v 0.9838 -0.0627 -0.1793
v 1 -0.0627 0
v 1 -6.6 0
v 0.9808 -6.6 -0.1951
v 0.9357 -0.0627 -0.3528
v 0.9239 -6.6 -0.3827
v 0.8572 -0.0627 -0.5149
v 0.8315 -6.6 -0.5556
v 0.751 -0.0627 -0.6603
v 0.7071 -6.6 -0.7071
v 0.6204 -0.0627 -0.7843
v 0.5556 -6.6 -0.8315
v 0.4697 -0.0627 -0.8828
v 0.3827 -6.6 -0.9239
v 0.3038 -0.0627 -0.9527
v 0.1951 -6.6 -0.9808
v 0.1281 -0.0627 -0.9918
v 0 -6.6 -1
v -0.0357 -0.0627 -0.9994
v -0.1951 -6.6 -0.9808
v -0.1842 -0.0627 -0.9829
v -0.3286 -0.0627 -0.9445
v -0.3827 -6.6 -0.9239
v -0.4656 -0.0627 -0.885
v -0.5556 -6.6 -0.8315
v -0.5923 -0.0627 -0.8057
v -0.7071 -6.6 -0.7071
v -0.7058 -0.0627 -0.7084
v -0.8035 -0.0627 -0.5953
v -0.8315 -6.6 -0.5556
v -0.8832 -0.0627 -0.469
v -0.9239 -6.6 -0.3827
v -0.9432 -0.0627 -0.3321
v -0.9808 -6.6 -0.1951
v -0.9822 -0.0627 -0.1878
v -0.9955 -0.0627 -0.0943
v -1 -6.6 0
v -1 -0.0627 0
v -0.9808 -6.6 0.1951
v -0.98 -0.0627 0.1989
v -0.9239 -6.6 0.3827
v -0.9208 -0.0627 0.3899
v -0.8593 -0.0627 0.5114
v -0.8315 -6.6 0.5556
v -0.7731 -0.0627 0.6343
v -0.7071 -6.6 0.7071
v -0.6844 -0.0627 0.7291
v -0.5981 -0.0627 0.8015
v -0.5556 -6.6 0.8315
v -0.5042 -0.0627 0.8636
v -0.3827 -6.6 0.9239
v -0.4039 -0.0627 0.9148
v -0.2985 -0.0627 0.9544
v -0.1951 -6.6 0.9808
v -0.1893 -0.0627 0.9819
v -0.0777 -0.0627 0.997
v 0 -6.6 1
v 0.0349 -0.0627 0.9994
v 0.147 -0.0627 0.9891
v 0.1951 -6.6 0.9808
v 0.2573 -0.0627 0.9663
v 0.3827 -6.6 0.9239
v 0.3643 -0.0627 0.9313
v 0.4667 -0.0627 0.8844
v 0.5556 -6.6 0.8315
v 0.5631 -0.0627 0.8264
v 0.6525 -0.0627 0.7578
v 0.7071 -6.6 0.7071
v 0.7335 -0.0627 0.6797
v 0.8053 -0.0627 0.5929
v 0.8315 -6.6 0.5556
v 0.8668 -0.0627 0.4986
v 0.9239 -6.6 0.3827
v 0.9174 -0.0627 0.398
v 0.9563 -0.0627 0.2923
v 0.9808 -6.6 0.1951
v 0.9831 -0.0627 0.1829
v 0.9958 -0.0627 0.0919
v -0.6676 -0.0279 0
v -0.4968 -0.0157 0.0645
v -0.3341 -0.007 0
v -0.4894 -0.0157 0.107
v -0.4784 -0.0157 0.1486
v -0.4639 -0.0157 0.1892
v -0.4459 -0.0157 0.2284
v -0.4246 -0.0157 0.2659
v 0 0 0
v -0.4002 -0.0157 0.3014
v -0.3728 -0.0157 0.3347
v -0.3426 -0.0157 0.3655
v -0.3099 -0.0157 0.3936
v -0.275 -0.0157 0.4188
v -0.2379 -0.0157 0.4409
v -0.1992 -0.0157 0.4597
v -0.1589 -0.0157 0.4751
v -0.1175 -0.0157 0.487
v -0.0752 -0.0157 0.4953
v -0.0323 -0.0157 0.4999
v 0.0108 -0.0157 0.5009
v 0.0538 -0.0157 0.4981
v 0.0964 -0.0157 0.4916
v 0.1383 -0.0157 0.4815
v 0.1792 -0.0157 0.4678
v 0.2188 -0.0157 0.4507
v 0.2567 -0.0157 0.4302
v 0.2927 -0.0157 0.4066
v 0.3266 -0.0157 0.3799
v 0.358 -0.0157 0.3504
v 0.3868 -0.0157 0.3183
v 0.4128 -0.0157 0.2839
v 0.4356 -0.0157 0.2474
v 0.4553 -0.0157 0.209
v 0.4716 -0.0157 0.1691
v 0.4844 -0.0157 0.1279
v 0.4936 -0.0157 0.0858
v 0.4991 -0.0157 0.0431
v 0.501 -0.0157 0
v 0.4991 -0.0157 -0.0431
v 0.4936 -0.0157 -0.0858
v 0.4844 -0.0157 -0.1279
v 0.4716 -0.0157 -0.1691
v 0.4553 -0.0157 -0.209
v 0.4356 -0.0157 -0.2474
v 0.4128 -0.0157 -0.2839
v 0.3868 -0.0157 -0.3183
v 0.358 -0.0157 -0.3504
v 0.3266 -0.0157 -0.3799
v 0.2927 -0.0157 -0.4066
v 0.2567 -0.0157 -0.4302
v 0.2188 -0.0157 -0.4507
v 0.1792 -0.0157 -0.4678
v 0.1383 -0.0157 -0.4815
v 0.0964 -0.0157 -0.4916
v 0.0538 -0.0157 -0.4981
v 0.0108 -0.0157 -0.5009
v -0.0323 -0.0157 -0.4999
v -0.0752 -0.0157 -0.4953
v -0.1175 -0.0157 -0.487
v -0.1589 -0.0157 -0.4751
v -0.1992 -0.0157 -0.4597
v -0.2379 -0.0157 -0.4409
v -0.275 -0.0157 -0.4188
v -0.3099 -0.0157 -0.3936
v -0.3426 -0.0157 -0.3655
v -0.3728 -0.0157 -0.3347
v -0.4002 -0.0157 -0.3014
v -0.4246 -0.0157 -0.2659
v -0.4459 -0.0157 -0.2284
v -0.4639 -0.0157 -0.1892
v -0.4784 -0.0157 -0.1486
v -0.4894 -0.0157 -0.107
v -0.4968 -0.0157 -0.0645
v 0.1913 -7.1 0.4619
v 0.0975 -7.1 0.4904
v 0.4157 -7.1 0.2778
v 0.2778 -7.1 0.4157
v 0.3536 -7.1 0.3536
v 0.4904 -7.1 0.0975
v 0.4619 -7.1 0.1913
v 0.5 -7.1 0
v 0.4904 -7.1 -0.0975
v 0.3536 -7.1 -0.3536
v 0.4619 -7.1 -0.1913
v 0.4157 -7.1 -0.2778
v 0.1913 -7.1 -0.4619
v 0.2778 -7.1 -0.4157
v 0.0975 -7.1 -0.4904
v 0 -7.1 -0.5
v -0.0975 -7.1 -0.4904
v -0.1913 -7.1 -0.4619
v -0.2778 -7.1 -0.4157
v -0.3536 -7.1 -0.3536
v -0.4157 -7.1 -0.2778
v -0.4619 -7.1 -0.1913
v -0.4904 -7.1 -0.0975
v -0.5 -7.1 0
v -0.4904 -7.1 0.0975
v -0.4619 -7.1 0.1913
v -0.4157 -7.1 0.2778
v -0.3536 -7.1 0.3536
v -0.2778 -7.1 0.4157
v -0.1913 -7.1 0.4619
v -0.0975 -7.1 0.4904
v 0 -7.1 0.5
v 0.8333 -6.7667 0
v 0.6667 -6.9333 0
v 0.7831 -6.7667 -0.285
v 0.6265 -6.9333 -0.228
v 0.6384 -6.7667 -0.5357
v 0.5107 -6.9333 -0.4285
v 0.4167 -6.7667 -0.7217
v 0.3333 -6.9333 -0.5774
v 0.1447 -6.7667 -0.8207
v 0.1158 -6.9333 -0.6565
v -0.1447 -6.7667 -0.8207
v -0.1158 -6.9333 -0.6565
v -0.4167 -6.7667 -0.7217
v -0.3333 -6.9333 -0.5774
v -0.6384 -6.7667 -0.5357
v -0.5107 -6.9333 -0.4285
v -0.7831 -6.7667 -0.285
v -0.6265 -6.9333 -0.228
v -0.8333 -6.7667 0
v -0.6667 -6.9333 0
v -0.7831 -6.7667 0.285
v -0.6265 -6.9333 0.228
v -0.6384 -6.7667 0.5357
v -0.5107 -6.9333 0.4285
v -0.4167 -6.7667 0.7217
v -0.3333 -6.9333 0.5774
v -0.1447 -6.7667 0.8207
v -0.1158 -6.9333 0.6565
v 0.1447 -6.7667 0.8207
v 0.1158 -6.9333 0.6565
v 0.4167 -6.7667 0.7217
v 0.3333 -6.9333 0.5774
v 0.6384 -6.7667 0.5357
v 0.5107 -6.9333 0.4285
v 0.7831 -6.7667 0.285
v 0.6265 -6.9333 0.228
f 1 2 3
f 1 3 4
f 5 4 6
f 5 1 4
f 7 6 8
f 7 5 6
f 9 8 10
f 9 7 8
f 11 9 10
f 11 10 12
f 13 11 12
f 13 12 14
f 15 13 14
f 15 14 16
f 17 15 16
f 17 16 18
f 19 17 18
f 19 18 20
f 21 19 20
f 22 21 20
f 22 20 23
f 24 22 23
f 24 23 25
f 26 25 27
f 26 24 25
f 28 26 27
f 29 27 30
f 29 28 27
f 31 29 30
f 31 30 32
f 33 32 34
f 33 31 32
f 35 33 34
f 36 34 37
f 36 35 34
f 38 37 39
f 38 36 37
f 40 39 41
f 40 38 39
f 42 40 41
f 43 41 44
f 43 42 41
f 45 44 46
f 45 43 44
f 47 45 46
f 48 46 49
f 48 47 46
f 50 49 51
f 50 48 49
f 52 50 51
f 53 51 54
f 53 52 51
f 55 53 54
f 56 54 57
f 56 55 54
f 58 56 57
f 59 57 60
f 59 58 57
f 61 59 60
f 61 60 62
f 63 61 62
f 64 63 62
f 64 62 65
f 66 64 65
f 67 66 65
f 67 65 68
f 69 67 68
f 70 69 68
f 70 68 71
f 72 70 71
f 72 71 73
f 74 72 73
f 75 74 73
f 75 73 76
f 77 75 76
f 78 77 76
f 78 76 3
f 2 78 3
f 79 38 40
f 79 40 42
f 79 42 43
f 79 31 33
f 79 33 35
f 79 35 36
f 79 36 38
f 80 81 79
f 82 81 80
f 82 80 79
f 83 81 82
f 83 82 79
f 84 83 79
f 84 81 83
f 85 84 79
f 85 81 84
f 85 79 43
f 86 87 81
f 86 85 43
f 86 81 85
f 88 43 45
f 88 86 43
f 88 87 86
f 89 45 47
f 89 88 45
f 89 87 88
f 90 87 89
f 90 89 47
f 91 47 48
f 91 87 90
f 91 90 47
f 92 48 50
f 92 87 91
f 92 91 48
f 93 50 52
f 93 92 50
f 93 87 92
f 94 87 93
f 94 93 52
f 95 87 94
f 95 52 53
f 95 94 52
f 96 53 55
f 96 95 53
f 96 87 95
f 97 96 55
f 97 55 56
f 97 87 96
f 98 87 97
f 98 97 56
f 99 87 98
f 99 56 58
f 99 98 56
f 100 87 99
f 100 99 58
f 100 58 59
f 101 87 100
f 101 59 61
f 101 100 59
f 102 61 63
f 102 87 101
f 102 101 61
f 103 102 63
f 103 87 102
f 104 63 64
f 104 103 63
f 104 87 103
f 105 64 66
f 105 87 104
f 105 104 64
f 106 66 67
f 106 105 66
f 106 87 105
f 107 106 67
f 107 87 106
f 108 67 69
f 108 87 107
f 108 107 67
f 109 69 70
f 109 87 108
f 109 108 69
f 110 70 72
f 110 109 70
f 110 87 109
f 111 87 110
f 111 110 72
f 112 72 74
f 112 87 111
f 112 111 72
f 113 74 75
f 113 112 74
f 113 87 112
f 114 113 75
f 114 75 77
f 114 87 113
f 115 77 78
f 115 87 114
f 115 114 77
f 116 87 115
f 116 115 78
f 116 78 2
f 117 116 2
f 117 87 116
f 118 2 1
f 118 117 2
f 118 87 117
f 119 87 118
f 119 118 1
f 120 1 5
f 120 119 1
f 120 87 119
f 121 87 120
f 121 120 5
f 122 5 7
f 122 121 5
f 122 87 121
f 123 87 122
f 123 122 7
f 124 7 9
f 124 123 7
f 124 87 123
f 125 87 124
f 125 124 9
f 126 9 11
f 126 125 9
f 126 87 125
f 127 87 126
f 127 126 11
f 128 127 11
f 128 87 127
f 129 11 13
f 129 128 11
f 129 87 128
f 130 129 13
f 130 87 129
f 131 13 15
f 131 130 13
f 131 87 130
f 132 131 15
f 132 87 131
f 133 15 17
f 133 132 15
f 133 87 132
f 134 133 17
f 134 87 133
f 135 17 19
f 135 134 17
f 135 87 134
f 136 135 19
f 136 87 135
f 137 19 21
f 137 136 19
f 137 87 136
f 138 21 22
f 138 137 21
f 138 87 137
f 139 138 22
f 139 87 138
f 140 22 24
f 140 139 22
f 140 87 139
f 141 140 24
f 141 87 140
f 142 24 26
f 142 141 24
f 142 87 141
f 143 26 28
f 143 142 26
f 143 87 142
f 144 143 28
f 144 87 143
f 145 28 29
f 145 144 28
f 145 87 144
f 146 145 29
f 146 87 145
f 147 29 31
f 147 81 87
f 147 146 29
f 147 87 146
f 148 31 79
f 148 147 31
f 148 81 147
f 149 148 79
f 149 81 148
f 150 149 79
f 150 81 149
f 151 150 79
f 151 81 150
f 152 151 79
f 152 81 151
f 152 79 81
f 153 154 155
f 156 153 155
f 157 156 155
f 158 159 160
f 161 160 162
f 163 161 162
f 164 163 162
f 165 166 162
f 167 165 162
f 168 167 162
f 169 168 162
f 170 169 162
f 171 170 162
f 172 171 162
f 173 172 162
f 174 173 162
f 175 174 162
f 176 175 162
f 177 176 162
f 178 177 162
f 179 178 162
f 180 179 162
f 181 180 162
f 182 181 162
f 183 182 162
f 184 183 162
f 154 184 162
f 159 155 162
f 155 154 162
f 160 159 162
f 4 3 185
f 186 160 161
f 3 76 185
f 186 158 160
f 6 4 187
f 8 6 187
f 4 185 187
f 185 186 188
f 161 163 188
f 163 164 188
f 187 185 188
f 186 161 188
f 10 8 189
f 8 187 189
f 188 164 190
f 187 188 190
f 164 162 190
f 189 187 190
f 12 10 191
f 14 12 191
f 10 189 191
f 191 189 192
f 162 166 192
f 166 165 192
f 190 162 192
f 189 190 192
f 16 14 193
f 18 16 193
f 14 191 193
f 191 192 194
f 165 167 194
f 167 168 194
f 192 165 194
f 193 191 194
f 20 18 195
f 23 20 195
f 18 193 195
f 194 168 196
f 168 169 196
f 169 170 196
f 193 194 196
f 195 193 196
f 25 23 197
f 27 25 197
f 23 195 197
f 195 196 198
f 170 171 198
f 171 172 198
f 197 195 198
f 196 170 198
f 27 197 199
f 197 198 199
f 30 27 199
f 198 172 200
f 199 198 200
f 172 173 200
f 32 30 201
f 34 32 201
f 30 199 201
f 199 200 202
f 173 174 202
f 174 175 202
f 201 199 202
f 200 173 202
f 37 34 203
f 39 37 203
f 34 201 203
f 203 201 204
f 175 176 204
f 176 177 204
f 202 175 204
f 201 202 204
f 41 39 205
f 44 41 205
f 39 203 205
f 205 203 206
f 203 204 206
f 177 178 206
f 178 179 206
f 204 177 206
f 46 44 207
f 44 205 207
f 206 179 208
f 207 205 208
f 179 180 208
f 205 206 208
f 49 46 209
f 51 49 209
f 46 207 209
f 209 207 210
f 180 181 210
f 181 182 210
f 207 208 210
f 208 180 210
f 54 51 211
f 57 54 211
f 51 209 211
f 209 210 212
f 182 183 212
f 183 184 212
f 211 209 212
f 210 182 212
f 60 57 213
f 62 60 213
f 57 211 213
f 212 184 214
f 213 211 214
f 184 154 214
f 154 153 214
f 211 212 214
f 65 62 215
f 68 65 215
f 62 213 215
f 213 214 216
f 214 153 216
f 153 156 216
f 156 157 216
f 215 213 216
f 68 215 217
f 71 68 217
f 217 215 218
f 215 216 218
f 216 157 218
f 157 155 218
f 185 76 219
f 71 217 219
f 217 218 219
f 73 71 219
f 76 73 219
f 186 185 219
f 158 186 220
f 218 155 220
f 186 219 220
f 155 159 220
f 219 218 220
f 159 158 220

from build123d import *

# Parameters (mm, degrees)
SKETCH1_R                 = 1
BOSS_EXTRUDE_7_10MM_DEPTH = 7.1
F_0_5_X_45_DEG_SIZE       = 0.5


with BuildPart() as part:
    # Sketch1 → Boss-Extrude 7.10mm (new body)
    with BuildSketch(Plane(origin=(0, 0, 0), x_dir=(1, 0, 0), z_dir=(0, 1, 0))):
        Circle(SKETCH1_R)
    extrude(amount=-BOSS_EXTRUDE_7_10MM_DEPTH)

    # 0.5 x 45 deg
    f_0_5_x_45_deg_edges = [part.edges().sort_by_distance(p)[0] for p in [
        (-1, -7.1, 0),
    ]]
    chamfer(f_0_5_x_45_deg_edges, length=F_0_5_X_45_DEG_SIZE)

    # Sketch2 → SR8 (revolve, cut)
    with BuildSketch(Plane.XY):
        with BuildLine():
            Line((0, 2), (-2, 2))
            Line((-2, 2), (-2, -0.254033308))
            ThreePointArc((-2, -0.254033308), (-1.00803434, -0.06376243), (0, 0))
            Line((0, 0), (0, 2))
        make_face()
    revolve(axis=Axis((0, 0, 0), (0, 1, 0)), mode=Mode.SUBTRACT)


solid = part.part
